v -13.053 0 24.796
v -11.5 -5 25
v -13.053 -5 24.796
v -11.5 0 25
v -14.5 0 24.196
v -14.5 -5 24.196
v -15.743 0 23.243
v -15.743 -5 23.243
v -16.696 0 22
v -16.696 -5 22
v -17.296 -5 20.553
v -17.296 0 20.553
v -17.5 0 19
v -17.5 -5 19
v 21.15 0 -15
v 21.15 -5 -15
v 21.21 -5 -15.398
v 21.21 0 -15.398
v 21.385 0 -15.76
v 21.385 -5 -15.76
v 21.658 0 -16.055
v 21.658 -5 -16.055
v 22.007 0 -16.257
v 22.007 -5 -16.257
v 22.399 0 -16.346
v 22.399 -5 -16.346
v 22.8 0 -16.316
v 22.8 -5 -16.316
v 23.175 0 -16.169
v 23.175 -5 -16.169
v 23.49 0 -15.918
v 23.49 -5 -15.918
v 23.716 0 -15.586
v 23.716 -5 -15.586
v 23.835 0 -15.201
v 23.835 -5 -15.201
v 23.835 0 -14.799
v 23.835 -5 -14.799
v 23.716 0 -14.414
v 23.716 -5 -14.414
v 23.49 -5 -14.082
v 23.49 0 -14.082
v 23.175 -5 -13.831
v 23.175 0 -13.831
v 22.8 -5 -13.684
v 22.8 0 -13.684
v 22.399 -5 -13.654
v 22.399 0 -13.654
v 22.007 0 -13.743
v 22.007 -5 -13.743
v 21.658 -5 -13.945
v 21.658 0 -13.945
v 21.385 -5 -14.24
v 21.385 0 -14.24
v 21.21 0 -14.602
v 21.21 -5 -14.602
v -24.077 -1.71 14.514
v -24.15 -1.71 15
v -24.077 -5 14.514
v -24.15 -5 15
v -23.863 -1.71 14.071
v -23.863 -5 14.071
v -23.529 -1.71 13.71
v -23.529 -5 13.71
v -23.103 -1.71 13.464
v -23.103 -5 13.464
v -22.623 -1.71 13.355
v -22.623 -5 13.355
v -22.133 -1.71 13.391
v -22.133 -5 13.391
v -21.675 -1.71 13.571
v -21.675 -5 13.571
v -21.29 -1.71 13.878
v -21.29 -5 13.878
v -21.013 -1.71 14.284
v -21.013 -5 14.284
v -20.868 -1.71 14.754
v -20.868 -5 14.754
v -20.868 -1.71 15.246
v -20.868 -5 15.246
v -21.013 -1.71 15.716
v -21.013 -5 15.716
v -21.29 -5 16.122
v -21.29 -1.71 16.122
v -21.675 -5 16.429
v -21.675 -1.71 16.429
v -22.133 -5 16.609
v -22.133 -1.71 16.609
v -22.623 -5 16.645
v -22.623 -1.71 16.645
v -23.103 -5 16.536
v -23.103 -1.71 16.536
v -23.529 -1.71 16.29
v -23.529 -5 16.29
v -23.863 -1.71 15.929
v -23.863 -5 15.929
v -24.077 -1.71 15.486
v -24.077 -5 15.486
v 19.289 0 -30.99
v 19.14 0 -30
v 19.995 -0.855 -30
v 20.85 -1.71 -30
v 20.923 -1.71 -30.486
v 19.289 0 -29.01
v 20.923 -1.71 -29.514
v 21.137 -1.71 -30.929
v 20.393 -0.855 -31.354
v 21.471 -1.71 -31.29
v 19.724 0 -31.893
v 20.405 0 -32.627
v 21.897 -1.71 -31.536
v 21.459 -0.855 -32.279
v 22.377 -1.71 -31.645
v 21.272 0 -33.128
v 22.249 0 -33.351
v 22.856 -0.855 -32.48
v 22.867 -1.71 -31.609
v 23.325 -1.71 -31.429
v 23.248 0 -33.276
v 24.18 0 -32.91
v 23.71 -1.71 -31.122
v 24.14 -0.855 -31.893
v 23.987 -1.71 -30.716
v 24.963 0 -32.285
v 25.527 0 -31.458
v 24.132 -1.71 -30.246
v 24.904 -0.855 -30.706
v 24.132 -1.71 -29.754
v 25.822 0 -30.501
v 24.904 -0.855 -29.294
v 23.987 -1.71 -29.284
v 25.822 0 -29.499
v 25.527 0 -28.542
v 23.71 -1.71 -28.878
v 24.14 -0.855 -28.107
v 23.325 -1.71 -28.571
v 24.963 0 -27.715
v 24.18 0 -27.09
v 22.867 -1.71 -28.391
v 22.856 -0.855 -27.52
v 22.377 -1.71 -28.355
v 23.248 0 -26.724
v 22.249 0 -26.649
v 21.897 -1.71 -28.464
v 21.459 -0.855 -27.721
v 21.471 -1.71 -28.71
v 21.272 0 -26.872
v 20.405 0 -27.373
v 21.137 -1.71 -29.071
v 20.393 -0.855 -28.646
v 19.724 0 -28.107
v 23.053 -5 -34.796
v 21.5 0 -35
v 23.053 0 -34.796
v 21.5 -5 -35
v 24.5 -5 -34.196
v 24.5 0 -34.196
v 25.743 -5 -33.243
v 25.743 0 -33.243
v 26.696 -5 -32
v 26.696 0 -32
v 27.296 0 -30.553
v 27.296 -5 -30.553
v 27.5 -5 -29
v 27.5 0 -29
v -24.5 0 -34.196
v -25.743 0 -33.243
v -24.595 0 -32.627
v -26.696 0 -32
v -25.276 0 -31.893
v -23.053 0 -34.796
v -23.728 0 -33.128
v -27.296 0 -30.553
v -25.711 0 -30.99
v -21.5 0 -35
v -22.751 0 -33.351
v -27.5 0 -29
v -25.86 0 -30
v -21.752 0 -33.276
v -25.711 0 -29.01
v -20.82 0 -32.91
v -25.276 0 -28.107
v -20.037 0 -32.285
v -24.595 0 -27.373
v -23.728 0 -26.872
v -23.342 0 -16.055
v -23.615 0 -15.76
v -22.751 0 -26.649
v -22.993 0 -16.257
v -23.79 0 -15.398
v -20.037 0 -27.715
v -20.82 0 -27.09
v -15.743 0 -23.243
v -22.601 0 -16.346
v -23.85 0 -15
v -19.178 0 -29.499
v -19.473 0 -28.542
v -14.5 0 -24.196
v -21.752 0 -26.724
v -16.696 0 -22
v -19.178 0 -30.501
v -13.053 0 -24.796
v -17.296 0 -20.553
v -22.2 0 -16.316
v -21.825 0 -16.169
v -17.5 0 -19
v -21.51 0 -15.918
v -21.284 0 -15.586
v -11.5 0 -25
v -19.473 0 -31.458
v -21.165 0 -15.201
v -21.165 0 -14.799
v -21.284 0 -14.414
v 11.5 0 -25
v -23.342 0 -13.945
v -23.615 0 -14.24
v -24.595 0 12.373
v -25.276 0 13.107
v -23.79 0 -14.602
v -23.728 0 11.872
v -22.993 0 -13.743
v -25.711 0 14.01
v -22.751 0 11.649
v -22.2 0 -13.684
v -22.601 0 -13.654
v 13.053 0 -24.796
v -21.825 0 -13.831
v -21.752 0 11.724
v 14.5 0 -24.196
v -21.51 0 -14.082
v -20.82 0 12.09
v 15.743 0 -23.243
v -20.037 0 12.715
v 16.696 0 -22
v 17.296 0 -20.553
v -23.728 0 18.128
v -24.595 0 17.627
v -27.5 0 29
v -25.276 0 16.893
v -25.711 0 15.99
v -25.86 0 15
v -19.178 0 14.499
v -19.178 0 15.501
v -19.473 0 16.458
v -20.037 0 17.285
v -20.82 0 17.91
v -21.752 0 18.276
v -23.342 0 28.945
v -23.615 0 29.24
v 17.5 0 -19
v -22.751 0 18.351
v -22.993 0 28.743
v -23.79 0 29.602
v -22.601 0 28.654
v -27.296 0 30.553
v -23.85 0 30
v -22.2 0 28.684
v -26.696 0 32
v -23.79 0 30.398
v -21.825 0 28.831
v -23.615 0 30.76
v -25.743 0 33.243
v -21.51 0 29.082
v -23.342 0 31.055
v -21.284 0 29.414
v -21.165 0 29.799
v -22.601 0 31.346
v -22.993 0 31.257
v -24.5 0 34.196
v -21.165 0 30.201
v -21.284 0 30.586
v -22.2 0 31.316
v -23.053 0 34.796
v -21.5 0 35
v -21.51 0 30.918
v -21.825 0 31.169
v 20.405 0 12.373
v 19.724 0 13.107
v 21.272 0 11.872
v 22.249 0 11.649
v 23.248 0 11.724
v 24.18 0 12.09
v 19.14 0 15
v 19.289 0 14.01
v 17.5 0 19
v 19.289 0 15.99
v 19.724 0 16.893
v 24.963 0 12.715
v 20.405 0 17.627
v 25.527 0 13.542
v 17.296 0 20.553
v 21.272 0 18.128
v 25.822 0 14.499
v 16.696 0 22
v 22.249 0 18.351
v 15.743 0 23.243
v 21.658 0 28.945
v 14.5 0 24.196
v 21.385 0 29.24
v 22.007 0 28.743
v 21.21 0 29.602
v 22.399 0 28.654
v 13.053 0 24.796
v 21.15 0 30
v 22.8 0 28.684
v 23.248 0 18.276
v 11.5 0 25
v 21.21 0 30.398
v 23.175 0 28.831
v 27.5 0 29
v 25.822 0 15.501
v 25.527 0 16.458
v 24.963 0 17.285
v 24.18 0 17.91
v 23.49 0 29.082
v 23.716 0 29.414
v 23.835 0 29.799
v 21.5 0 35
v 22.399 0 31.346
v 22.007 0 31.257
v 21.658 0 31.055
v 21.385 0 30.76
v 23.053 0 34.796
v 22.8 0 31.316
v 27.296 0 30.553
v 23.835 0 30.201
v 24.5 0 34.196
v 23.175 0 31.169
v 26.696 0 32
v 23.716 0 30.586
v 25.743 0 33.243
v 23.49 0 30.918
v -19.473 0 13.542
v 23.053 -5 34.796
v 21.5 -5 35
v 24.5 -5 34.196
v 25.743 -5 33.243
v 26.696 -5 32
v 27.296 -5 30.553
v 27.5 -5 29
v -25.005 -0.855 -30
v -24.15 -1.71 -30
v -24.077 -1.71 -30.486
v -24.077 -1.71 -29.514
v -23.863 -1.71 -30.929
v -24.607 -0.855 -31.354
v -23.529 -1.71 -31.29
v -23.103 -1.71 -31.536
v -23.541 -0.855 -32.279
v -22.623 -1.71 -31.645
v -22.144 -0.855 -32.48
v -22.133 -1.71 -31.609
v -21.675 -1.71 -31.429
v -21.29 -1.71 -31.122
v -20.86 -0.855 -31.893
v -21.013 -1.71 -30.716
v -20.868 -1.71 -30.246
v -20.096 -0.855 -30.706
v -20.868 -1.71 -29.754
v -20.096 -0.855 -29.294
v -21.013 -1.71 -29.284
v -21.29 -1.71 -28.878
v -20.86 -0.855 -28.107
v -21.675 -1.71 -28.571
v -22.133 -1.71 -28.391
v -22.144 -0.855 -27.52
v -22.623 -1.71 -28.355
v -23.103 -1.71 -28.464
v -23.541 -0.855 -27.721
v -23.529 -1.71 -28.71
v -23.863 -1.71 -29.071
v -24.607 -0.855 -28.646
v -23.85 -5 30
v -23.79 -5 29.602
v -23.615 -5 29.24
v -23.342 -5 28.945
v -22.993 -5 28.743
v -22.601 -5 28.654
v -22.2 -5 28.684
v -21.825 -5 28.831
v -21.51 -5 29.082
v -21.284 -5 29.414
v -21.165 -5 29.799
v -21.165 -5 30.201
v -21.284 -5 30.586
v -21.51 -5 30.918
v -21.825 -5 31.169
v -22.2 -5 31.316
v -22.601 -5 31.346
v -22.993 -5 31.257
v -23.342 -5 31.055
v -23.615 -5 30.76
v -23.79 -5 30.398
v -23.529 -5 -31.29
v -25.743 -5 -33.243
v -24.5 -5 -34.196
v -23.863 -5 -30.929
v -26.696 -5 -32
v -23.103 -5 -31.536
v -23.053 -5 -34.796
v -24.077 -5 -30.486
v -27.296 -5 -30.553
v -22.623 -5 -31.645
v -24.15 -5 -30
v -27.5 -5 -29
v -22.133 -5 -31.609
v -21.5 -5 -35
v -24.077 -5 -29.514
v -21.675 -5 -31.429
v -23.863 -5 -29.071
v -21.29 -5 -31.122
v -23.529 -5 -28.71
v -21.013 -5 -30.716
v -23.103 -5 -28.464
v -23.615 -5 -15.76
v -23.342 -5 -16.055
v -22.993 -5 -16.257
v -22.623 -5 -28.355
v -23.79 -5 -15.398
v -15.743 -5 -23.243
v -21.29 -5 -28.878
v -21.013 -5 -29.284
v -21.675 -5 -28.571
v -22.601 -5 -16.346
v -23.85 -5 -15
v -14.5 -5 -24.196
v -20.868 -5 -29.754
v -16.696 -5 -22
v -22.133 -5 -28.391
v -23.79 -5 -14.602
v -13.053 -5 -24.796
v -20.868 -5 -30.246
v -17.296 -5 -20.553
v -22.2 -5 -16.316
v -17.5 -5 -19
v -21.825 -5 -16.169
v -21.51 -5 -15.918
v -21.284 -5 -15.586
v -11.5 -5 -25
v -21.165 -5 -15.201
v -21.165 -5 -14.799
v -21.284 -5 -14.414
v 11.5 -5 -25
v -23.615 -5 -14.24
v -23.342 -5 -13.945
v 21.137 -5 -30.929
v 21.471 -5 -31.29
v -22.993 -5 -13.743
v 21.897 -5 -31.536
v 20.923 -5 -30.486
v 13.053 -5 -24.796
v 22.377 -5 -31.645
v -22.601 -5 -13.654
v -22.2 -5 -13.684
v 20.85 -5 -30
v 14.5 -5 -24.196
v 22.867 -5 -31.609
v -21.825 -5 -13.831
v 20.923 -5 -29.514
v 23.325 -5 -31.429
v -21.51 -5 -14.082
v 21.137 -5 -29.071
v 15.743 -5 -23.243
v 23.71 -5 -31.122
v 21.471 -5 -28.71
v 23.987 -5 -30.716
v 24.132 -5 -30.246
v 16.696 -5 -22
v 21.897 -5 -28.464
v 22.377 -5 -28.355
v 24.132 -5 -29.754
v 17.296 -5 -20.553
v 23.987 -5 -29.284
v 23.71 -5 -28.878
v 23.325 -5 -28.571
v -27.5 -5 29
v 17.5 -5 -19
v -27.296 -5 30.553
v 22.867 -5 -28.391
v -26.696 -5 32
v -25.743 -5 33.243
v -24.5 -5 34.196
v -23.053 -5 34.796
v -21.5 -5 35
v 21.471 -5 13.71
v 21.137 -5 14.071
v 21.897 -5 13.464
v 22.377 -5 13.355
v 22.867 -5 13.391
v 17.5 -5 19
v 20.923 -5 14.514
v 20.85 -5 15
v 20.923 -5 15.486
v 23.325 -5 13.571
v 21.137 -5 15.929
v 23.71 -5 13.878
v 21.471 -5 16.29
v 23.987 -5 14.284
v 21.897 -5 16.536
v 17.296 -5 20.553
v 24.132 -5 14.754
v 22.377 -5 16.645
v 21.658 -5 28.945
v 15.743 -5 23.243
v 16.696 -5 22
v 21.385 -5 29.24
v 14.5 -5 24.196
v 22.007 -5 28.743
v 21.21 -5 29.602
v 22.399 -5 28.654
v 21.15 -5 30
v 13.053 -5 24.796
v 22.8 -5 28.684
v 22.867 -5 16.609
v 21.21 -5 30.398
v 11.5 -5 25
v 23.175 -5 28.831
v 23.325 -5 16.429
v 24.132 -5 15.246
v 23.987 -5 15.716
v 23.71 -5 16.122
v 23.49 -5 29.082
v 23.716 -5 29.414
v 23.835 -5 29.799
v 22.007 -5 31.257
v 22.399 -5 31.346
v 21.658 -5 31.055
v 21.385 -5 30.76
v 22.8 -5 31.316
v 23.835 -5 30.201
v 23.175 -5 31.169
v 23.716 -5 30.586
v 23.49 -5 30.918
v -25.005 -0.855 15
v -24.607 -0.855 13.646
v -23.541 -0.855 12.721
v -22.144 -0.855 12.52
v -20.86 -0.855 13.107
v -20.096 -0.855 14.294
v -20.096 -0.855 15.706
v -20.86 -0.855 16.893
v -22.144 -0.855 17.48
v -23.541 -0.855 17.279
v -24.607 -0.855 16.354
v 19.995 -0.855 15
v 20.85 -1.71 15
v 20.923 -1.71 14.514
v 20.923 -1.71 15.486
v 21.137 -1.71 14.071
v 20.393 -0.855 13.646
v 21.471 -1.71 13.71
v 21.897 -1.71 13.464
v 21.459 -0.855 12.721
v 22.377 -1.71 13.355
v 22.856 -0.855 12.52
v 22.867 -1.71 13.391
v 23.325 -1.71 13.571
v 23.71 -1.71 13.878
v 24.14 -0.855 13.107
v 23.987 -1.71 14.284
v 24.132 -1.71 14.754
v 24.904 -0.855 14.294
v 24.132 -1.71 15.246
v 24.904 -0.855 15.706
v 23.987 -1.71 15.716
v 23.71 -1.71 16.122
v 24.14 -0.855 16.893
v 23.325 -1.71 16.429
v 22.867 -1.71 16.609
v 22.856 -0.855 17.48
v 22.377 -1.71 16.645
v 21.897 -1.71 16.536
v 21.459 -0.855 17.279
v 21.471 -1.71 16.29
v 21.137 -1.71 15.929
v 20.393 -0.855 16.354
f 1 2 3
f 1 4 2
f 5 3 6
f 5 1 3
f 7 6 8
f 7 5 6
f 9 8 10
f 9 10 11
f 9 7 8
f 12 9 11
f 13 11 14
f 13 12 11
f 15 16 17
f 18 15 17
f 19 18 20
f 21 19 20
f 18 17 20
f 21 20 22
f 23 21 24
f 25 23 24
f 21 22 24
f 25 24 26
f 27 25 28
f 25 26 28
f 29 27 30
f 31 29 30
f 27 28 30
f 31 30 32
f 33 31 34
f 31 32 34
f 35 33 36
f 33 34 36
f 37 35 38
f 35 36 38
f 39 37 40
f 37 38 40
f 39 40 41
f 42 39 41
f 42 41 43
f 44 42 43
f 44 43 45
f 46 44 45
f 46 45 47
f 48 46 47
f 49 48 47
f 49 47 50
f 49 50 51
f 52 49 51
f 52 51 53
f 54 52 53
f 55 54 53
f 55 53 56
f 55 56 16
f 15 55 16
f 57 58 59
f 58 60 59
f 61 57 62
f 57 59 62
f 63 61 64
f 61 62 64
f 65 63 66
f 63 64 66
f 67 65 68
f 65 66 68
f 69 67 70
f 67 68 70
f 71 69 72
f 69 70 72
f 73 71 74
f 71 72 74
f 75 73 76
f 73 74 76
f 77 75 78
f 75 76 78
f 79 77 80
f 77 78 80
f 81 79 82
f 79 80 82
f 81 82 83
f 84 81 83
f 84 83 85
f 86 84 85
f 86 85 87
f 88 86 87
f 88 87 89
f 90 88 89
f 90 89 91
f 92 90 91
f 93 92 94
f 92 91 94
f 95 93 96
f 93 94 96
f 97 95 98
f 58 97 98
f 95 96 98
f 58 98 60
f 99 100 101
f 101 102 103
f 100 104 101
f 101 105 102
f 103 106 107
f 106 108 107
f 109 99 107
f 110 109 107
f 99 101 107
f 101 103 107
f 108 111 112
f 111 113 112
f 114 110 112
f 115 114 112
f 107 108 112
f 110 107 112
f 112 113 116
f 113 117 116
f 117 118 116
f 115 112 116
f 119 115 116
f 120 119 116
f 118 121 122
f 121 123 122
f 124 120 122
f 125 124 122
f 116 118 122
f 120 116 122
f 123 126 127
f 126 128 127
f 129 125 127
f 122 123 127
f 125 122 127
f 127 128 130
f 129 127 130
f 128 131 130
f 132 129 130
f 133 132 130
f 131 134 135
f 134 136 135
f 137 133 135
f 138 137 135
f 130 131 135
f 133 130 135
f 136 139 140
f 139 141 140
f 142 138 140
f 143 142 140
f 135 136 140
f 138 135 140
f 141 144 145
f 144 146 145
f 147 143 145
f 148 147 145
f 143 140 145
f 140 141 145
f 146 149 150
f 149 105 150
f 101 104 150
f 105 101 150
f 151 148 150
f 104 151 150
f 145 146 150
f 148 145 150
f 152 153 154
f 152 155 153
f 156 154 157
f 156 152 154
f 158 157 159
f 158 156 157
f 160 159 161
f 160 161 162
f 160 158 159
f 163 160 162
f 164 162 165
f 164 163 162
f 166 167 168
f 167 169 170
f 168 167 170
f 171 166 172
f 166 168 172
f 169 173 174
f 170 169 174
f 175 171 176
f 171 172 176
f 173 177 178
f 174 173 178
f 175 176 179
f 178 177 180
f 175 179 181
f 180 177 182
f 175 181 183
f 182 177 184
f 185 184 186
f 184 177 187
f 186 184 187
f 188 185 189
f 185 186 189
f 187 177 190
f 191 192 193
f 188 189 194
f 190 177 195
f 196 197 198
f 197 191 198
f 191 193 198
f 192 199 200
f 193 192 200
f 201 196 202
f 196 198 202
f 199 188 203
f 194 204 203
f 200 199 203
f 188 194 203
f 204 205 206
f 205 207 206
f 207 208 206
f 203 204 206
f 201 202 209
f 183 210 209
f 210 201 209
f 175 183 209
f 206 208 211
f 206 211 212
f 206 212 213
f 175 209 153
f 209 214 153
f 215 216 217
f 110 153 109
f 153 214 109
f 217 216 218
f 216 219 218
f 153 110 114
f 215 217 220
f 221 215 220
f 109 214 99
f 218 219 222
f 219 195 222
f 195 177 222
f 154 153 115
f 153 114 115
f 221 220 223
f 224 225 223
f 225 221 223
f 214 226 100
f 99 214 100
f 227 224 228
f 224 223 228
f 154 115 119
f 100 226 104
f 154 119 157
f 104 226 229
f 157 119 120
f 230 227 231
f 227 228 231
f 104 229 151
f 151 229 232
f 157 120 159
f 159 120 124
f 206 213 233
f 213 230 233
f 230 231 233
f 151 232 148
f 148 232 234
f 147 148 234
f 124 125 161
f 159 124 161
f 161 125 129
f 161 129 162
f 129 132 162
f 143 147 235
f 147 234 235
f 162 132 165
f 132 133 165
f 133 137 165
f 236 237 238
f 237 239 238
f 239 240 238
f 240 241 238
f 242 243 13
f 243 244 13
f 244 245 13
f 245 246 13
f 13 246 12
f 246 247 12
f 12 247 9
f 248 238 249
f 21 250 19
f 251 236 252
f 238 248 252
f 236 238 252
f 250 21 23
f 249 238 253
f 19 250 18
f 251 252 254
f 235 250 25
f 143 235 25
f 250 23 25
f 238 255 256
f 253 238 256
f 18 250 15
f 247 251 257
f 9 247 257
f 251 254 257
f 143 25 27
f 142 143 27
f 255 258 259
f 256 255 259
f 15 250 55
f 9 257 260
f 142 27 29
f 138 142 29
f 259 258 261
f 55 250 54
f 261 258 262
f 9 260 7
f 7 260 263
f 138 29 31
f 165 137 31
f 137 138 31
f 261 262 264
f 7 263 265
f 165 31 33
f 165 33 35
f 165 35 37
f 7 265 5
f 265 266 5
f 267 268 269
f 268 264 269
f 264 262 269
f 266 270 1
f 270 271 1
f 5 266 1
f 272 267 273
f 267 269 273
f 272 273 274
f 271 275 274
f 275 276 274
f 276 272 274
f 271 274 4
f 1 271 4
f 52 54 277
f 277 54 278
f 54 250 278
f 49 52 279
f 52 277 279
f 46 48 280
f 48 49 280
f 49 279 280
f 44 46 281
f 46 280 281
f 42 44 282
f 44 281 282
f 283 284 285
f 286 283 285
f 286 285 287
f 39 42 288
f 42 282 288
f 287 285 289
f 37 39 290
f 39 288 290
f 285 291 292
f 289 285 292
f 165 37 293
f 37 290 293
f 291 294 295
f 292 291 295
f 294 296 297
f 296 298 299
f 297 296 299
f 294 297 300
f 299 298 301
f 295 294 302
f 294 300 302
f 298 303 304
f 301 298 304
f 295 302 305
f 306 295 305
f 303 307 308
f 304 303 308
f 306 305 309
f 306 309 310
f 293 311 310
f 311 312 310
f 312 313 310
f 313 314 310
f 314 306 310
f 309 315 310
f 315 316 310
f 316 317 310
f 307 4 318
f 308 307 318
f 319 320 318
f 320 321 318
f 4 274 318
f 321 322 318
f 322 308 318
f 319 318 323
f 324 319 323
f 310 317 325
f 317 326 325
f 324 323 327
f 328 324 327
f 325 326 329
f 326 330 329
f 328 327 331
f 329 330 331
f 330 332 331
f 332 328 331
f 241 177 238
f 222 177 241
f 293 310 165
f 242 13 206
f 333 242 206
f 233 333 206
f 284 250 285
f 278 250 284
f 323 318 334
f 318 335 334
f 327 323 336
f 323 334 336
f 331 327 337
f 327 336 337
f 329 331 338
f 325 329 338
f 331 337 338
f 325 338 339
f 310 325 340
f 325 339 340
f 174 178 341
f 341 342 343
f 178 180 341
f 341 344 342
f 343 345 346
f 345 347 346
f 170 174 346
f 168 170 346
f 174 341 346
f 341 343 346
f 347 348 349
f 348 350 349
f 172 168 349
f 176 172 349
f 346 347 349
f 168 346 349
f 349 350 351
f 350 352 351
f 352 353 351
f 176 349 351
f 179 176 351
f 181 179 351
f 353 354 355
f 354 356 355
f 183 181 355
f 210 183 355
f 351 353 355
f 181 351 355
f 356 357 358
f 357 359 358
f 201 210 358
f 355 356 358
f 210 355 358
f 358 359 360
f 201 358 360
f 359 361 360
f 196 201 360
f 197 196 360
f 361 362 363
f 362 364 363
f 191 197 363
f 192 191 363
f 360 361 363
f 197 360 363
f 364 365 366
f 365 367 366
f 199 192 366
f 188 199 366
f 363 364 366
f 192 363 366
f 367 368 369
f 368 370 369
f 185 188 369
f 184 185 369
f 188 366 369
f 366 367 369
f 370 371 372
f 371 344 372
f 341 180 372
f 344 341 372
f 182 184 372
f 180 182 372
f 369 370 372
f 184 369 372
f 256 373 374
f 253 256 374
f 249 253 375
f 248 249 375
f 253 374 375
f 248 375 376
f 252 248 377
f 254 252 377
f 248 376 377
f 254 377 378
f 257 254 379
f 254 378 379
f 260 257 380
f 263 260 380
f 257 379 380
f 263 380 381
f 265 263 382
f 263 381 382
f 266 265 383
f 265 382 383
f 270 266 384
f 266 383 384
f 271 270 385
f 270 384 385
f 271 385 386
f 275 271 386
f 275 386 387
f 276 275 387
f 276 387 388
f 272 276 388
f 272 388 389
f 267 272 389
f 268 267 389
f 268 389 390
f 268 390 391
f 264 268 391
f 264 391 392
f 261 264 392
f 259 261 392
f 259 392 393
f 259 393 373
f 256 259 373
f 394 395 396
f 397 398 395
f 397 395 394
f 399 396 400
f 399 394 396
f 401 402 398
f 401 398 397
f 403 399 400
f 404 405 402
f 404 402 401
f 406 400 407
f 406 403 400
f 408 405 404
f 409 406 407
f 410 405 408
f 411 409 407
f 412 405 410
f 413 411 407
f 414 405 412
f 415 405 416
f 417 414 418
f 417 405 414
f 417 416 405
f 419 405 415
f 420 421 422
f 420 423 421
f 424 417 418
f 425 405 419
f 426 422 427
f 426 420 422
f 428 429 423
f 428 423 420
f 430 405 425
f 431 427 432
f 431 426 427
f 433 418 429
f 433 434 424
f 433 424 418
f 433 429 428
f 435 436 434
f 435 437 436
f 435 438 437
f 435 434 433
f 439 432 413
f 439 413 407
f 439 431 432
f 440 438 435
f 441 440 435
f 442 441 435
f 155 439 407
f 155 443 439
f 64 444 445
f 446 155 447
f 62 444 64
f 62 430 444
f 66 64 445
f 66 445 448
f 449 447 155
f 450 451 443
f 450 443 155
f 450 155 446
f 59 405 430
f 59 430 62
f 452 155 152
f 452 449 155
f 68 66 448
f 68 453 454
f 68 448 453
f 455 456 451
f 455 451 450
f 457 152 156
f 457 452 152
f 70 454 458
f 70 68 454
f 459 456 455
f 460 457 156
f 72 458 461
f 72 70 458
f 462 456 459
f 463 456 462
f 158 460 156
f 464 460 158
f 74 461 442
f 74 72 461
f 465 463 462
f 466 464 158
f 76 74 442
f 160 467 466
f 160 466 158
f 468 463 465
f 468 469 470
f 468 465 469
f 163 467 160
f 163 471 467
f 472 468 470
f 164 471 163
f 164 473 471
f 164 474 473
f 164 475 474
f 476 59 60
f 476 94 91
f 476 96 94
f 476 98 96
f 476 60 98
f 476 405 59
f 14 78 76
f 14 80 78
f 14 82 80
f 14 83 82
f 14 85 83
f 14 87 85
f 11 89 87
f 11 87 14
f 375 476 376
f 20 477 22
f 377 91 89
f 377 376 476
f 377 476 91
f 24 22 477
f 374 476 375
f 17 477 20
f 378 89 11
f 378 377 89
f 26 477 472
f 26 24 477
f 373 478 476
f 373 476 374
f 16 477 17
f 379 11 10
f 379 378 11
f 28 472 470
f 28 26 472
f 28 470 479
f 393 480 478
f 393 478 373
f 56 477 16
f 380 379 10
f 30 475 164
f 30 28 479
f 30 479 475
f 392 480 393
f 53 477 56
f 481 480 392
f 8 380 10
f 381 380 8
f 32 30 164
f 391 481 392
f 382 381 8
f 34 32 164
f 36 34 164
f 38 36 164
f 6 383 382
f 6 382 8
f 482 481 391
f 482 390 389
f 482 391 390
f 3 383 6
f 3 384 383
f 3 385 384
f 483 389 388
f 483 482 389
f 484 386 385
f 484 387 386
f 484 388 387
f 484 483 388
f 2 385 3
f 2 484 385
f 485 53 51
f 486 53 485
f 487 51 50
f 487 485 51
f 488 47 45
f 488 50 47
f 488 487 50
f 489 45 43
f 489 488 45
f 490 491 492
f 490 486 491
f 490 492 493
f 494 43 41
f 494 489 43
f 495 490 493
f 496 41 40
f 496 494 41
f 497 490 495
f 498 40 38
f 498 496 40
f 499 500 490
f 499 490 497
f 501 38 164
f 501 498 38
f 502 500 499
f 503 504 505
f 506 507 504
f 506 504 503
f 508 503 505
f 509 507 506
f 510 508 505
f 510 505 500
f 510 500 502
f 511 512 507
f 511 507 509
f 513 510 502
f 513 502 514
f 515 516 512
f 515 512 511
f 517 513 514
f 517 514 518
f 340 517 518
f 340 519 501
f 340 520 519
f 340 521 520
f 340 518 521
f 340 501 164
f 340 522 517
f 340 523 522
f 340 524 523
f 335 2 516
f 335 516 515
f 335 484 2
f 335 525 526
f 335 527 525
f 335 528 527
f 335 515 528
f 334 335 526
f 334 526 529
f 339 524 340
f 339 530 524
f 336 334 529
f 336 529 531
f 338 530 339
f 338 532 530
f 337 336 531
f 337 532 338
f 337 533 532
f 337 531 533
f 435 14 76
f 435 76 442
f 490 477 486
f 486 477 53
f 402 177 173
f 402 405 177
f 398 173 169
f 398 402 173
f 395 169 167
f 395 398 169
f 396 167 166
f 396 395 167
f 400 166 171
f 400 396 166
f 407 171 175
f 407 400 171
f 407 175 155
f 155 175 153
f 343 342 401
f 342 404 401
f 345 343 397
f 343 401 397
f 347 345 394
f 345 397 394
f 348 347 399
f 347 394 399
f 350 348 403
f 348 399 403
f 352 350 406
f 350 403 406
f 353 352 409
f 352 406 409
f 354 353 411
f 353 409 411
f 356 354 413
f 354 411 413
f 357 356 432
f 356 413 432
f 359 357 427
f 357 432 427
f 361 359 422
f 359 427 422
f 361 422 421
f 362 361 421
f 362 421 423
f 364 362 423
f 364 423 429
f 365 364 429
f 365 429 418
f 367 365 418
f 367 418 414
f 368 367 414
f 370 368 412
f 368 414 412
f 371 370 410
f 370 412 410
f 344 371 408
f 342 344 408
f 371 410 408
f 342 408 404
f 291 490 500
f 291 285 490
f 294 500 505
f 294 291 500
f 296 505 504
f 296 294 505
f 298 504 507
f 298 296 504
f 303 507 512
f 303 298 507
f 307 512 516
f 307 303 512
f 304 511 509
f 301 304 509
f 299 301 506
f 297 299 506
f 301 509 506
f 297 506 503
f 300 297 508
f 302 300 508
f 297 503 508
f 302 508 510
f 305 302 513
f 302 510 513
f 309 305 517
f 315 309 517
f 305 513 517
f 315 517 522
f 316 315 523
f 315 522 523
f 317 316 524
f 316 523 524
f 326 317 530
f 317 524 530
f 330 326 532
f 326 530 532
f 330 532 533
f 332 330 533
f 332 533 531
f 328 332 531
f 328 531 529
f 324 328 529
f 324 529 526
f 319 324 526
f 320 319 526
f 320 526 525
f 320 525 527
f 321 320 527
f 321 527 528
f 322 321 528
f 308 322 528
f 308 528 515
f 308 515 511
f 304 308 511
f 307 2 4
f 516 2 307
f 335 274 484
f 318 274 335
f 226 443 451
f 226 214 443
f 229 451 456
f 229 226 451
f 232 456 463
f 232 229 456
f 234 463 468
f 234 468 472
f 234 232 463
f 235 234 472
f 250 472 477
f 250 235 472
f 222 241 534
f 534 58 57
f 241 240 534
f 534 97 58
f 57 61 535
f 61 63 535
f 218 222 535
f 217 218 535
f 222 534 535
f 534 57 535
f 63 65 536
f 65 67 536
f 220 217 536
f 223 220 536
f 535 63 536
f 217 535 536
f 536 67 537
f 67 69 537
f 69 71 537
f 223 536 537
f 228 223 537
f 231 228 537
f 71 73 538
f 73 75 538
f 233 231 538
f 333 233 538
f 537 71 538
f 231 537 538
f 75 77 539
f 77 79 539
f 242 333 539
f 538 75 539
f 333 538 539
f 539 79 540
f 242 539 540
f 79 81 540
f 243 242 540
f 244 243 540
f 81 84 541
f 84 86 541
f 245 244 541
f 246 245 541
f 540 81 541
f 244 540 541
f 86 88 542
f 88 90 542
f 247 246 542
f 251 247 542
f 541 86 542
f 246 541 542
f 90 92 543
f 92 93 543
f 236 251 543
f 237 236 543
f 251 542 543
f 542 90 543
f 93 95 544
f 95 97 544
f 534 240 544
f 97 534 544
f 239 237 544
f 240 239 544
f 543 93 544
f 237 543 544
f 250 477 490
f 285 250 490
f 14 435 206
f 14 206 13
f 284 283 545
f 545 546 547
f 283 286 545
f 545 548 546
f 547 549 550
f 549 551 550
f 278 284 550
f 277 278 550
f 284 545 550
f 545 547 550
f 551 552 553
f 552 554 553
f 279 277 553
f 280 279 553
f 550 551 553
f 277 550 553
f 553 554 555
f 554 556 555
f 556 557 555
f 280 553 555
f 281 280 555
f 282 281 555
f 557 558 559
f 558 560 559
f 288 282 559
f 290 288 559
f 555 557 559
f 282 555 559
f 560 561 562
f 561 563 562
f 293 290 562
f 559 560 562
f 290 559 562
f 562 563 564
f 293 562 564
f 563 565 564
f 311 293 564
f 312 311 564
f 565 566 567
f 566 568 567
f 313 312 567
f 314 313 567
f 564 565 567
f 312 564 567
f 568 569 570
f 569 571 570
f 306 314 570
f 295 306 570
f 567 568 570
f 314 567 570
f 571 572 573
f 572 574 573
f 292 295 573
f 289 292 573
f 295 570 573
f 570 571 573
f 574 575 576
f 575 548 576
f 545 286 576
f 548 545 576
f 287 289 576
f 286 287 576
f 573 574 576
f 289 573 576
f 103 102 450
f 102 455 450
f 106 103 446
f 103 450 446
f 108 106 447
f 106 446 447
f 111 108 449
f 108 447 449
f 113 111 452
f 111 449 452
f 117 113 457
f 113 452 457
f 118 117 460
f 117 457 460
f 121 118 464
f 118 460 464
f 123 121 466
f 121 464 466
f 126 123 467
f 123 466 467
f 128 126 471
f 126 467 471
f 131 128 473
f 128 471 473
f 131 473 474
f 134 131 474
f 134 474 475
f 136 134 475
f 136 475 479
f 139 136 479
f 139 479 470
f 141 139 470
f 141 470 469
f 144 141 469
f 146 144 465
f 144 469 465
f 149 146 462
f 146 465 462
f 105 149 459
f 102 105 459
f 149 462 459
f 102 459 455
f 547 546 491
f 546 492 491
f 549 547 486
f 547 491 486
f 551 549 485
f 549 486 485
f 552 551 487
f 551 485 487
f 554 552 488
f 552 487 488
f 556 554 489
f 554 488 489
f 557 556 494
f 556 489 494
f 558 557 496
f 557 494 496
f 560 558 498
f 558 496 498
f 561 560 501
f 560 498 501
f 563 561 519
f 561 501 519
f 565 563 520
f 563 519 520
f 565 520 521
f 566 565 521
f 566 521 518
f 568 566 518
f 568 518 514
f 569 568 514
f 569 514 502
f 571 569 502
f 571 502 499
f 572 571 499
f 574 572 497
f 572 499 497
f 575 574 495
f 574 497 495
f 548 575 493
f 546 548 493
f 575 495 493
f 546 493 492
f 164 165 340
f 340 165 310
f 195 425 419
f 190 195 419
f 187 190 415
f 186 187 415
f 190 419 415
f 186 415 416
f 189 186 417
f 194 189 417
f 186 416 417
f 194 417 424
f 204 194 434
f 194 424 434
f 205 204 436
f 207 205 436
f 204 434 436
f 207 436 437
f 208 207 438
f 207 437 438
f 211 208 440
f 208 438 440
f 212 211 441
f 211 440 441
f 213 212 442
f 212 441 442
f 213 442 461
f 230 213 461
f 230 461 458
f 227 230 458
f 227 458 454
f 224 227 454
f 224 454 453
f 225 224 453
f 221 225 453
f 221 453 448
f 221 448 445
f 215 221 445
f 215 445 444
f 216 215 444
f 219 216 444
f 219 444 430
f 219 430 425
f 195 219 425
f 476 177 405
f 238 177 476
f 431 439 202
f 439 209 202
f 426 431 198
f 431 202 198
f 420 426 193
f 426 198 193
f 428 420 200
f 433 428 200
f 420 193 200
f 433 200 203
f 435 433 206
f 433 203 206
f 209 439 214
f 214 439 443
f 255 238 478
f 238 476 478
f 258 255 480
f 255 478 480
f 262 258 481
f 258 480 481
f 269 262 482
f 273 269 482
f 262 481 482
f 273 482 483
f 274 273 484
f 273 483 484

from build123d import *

# Parameters (mm, degrees)
F0_W           = 55
F0_H           = 70
F1_DEPTH       = 5
F2_D           = 3.3
F2_CSINK_D     = 6.72
F2_CSINK_ANGLE = 90
F3_D           = 2.7
F4_W           = 35
F4_H           = 50
F5_DEPTH       = 5
F6_R           = 6


with BuildPart() as f1:
    # F0 (on Front) → F1 (new body)
    with BuildSketch(Plane.XZ):
        Rectangle(F0_W, F0_H)
    extrude(amount=F1_DEPTH)

    # F2 (through all)
    with Locations(Plane(origin=(0, 0, 0), x_dir=(1, 0, 0), z_dir=(0, 1, 0))):
        with Locations((22.5, -15), (22.5, 30), (-22.5, 30), (-22.5, -15)):
            CounterSinkHole(F2_D / 2, F2_CSINK_D / 2, counter_sink_angle=F2_CSINK_ANGLE)

    # F3 (through all)
    with Locations(Plane(origin=(0, 0, 0), x_dir=(1, 0, 0), z_dir=(0, 1, 0))):
        with Locations((22.5, -30), (-22.5, -30), (-22.5, 15), (22.5, 15)):
            Hole(F3_D / 2)

    # F4 (on face) → F5 (cut, through all)
    with BuildSketch(Plane.XZ.offset(5)):
        Rectangle(F4_W, F4_H)
    extrude(amount=-F5_DEPTH, mode=Mode.SUBTRACT)

    # F6
    f6_edges = [f1.edges().sort_by_distance(p)[0] for p in [
        (-27.5, -2.5, 35),
        (-27.5, -2.5, -35),
        (27.5, -2.5, 35),
        (27.5, -2.5, -35),
        (-17.5, -2.5, -25),
        (17.5, -2.5, 25),
        (17.5, -2.5, -25),
        (-17.5, -2.5, 25),
    ]]
    fillet(f6_edges, radius=F6_R)


solid = f1.part
